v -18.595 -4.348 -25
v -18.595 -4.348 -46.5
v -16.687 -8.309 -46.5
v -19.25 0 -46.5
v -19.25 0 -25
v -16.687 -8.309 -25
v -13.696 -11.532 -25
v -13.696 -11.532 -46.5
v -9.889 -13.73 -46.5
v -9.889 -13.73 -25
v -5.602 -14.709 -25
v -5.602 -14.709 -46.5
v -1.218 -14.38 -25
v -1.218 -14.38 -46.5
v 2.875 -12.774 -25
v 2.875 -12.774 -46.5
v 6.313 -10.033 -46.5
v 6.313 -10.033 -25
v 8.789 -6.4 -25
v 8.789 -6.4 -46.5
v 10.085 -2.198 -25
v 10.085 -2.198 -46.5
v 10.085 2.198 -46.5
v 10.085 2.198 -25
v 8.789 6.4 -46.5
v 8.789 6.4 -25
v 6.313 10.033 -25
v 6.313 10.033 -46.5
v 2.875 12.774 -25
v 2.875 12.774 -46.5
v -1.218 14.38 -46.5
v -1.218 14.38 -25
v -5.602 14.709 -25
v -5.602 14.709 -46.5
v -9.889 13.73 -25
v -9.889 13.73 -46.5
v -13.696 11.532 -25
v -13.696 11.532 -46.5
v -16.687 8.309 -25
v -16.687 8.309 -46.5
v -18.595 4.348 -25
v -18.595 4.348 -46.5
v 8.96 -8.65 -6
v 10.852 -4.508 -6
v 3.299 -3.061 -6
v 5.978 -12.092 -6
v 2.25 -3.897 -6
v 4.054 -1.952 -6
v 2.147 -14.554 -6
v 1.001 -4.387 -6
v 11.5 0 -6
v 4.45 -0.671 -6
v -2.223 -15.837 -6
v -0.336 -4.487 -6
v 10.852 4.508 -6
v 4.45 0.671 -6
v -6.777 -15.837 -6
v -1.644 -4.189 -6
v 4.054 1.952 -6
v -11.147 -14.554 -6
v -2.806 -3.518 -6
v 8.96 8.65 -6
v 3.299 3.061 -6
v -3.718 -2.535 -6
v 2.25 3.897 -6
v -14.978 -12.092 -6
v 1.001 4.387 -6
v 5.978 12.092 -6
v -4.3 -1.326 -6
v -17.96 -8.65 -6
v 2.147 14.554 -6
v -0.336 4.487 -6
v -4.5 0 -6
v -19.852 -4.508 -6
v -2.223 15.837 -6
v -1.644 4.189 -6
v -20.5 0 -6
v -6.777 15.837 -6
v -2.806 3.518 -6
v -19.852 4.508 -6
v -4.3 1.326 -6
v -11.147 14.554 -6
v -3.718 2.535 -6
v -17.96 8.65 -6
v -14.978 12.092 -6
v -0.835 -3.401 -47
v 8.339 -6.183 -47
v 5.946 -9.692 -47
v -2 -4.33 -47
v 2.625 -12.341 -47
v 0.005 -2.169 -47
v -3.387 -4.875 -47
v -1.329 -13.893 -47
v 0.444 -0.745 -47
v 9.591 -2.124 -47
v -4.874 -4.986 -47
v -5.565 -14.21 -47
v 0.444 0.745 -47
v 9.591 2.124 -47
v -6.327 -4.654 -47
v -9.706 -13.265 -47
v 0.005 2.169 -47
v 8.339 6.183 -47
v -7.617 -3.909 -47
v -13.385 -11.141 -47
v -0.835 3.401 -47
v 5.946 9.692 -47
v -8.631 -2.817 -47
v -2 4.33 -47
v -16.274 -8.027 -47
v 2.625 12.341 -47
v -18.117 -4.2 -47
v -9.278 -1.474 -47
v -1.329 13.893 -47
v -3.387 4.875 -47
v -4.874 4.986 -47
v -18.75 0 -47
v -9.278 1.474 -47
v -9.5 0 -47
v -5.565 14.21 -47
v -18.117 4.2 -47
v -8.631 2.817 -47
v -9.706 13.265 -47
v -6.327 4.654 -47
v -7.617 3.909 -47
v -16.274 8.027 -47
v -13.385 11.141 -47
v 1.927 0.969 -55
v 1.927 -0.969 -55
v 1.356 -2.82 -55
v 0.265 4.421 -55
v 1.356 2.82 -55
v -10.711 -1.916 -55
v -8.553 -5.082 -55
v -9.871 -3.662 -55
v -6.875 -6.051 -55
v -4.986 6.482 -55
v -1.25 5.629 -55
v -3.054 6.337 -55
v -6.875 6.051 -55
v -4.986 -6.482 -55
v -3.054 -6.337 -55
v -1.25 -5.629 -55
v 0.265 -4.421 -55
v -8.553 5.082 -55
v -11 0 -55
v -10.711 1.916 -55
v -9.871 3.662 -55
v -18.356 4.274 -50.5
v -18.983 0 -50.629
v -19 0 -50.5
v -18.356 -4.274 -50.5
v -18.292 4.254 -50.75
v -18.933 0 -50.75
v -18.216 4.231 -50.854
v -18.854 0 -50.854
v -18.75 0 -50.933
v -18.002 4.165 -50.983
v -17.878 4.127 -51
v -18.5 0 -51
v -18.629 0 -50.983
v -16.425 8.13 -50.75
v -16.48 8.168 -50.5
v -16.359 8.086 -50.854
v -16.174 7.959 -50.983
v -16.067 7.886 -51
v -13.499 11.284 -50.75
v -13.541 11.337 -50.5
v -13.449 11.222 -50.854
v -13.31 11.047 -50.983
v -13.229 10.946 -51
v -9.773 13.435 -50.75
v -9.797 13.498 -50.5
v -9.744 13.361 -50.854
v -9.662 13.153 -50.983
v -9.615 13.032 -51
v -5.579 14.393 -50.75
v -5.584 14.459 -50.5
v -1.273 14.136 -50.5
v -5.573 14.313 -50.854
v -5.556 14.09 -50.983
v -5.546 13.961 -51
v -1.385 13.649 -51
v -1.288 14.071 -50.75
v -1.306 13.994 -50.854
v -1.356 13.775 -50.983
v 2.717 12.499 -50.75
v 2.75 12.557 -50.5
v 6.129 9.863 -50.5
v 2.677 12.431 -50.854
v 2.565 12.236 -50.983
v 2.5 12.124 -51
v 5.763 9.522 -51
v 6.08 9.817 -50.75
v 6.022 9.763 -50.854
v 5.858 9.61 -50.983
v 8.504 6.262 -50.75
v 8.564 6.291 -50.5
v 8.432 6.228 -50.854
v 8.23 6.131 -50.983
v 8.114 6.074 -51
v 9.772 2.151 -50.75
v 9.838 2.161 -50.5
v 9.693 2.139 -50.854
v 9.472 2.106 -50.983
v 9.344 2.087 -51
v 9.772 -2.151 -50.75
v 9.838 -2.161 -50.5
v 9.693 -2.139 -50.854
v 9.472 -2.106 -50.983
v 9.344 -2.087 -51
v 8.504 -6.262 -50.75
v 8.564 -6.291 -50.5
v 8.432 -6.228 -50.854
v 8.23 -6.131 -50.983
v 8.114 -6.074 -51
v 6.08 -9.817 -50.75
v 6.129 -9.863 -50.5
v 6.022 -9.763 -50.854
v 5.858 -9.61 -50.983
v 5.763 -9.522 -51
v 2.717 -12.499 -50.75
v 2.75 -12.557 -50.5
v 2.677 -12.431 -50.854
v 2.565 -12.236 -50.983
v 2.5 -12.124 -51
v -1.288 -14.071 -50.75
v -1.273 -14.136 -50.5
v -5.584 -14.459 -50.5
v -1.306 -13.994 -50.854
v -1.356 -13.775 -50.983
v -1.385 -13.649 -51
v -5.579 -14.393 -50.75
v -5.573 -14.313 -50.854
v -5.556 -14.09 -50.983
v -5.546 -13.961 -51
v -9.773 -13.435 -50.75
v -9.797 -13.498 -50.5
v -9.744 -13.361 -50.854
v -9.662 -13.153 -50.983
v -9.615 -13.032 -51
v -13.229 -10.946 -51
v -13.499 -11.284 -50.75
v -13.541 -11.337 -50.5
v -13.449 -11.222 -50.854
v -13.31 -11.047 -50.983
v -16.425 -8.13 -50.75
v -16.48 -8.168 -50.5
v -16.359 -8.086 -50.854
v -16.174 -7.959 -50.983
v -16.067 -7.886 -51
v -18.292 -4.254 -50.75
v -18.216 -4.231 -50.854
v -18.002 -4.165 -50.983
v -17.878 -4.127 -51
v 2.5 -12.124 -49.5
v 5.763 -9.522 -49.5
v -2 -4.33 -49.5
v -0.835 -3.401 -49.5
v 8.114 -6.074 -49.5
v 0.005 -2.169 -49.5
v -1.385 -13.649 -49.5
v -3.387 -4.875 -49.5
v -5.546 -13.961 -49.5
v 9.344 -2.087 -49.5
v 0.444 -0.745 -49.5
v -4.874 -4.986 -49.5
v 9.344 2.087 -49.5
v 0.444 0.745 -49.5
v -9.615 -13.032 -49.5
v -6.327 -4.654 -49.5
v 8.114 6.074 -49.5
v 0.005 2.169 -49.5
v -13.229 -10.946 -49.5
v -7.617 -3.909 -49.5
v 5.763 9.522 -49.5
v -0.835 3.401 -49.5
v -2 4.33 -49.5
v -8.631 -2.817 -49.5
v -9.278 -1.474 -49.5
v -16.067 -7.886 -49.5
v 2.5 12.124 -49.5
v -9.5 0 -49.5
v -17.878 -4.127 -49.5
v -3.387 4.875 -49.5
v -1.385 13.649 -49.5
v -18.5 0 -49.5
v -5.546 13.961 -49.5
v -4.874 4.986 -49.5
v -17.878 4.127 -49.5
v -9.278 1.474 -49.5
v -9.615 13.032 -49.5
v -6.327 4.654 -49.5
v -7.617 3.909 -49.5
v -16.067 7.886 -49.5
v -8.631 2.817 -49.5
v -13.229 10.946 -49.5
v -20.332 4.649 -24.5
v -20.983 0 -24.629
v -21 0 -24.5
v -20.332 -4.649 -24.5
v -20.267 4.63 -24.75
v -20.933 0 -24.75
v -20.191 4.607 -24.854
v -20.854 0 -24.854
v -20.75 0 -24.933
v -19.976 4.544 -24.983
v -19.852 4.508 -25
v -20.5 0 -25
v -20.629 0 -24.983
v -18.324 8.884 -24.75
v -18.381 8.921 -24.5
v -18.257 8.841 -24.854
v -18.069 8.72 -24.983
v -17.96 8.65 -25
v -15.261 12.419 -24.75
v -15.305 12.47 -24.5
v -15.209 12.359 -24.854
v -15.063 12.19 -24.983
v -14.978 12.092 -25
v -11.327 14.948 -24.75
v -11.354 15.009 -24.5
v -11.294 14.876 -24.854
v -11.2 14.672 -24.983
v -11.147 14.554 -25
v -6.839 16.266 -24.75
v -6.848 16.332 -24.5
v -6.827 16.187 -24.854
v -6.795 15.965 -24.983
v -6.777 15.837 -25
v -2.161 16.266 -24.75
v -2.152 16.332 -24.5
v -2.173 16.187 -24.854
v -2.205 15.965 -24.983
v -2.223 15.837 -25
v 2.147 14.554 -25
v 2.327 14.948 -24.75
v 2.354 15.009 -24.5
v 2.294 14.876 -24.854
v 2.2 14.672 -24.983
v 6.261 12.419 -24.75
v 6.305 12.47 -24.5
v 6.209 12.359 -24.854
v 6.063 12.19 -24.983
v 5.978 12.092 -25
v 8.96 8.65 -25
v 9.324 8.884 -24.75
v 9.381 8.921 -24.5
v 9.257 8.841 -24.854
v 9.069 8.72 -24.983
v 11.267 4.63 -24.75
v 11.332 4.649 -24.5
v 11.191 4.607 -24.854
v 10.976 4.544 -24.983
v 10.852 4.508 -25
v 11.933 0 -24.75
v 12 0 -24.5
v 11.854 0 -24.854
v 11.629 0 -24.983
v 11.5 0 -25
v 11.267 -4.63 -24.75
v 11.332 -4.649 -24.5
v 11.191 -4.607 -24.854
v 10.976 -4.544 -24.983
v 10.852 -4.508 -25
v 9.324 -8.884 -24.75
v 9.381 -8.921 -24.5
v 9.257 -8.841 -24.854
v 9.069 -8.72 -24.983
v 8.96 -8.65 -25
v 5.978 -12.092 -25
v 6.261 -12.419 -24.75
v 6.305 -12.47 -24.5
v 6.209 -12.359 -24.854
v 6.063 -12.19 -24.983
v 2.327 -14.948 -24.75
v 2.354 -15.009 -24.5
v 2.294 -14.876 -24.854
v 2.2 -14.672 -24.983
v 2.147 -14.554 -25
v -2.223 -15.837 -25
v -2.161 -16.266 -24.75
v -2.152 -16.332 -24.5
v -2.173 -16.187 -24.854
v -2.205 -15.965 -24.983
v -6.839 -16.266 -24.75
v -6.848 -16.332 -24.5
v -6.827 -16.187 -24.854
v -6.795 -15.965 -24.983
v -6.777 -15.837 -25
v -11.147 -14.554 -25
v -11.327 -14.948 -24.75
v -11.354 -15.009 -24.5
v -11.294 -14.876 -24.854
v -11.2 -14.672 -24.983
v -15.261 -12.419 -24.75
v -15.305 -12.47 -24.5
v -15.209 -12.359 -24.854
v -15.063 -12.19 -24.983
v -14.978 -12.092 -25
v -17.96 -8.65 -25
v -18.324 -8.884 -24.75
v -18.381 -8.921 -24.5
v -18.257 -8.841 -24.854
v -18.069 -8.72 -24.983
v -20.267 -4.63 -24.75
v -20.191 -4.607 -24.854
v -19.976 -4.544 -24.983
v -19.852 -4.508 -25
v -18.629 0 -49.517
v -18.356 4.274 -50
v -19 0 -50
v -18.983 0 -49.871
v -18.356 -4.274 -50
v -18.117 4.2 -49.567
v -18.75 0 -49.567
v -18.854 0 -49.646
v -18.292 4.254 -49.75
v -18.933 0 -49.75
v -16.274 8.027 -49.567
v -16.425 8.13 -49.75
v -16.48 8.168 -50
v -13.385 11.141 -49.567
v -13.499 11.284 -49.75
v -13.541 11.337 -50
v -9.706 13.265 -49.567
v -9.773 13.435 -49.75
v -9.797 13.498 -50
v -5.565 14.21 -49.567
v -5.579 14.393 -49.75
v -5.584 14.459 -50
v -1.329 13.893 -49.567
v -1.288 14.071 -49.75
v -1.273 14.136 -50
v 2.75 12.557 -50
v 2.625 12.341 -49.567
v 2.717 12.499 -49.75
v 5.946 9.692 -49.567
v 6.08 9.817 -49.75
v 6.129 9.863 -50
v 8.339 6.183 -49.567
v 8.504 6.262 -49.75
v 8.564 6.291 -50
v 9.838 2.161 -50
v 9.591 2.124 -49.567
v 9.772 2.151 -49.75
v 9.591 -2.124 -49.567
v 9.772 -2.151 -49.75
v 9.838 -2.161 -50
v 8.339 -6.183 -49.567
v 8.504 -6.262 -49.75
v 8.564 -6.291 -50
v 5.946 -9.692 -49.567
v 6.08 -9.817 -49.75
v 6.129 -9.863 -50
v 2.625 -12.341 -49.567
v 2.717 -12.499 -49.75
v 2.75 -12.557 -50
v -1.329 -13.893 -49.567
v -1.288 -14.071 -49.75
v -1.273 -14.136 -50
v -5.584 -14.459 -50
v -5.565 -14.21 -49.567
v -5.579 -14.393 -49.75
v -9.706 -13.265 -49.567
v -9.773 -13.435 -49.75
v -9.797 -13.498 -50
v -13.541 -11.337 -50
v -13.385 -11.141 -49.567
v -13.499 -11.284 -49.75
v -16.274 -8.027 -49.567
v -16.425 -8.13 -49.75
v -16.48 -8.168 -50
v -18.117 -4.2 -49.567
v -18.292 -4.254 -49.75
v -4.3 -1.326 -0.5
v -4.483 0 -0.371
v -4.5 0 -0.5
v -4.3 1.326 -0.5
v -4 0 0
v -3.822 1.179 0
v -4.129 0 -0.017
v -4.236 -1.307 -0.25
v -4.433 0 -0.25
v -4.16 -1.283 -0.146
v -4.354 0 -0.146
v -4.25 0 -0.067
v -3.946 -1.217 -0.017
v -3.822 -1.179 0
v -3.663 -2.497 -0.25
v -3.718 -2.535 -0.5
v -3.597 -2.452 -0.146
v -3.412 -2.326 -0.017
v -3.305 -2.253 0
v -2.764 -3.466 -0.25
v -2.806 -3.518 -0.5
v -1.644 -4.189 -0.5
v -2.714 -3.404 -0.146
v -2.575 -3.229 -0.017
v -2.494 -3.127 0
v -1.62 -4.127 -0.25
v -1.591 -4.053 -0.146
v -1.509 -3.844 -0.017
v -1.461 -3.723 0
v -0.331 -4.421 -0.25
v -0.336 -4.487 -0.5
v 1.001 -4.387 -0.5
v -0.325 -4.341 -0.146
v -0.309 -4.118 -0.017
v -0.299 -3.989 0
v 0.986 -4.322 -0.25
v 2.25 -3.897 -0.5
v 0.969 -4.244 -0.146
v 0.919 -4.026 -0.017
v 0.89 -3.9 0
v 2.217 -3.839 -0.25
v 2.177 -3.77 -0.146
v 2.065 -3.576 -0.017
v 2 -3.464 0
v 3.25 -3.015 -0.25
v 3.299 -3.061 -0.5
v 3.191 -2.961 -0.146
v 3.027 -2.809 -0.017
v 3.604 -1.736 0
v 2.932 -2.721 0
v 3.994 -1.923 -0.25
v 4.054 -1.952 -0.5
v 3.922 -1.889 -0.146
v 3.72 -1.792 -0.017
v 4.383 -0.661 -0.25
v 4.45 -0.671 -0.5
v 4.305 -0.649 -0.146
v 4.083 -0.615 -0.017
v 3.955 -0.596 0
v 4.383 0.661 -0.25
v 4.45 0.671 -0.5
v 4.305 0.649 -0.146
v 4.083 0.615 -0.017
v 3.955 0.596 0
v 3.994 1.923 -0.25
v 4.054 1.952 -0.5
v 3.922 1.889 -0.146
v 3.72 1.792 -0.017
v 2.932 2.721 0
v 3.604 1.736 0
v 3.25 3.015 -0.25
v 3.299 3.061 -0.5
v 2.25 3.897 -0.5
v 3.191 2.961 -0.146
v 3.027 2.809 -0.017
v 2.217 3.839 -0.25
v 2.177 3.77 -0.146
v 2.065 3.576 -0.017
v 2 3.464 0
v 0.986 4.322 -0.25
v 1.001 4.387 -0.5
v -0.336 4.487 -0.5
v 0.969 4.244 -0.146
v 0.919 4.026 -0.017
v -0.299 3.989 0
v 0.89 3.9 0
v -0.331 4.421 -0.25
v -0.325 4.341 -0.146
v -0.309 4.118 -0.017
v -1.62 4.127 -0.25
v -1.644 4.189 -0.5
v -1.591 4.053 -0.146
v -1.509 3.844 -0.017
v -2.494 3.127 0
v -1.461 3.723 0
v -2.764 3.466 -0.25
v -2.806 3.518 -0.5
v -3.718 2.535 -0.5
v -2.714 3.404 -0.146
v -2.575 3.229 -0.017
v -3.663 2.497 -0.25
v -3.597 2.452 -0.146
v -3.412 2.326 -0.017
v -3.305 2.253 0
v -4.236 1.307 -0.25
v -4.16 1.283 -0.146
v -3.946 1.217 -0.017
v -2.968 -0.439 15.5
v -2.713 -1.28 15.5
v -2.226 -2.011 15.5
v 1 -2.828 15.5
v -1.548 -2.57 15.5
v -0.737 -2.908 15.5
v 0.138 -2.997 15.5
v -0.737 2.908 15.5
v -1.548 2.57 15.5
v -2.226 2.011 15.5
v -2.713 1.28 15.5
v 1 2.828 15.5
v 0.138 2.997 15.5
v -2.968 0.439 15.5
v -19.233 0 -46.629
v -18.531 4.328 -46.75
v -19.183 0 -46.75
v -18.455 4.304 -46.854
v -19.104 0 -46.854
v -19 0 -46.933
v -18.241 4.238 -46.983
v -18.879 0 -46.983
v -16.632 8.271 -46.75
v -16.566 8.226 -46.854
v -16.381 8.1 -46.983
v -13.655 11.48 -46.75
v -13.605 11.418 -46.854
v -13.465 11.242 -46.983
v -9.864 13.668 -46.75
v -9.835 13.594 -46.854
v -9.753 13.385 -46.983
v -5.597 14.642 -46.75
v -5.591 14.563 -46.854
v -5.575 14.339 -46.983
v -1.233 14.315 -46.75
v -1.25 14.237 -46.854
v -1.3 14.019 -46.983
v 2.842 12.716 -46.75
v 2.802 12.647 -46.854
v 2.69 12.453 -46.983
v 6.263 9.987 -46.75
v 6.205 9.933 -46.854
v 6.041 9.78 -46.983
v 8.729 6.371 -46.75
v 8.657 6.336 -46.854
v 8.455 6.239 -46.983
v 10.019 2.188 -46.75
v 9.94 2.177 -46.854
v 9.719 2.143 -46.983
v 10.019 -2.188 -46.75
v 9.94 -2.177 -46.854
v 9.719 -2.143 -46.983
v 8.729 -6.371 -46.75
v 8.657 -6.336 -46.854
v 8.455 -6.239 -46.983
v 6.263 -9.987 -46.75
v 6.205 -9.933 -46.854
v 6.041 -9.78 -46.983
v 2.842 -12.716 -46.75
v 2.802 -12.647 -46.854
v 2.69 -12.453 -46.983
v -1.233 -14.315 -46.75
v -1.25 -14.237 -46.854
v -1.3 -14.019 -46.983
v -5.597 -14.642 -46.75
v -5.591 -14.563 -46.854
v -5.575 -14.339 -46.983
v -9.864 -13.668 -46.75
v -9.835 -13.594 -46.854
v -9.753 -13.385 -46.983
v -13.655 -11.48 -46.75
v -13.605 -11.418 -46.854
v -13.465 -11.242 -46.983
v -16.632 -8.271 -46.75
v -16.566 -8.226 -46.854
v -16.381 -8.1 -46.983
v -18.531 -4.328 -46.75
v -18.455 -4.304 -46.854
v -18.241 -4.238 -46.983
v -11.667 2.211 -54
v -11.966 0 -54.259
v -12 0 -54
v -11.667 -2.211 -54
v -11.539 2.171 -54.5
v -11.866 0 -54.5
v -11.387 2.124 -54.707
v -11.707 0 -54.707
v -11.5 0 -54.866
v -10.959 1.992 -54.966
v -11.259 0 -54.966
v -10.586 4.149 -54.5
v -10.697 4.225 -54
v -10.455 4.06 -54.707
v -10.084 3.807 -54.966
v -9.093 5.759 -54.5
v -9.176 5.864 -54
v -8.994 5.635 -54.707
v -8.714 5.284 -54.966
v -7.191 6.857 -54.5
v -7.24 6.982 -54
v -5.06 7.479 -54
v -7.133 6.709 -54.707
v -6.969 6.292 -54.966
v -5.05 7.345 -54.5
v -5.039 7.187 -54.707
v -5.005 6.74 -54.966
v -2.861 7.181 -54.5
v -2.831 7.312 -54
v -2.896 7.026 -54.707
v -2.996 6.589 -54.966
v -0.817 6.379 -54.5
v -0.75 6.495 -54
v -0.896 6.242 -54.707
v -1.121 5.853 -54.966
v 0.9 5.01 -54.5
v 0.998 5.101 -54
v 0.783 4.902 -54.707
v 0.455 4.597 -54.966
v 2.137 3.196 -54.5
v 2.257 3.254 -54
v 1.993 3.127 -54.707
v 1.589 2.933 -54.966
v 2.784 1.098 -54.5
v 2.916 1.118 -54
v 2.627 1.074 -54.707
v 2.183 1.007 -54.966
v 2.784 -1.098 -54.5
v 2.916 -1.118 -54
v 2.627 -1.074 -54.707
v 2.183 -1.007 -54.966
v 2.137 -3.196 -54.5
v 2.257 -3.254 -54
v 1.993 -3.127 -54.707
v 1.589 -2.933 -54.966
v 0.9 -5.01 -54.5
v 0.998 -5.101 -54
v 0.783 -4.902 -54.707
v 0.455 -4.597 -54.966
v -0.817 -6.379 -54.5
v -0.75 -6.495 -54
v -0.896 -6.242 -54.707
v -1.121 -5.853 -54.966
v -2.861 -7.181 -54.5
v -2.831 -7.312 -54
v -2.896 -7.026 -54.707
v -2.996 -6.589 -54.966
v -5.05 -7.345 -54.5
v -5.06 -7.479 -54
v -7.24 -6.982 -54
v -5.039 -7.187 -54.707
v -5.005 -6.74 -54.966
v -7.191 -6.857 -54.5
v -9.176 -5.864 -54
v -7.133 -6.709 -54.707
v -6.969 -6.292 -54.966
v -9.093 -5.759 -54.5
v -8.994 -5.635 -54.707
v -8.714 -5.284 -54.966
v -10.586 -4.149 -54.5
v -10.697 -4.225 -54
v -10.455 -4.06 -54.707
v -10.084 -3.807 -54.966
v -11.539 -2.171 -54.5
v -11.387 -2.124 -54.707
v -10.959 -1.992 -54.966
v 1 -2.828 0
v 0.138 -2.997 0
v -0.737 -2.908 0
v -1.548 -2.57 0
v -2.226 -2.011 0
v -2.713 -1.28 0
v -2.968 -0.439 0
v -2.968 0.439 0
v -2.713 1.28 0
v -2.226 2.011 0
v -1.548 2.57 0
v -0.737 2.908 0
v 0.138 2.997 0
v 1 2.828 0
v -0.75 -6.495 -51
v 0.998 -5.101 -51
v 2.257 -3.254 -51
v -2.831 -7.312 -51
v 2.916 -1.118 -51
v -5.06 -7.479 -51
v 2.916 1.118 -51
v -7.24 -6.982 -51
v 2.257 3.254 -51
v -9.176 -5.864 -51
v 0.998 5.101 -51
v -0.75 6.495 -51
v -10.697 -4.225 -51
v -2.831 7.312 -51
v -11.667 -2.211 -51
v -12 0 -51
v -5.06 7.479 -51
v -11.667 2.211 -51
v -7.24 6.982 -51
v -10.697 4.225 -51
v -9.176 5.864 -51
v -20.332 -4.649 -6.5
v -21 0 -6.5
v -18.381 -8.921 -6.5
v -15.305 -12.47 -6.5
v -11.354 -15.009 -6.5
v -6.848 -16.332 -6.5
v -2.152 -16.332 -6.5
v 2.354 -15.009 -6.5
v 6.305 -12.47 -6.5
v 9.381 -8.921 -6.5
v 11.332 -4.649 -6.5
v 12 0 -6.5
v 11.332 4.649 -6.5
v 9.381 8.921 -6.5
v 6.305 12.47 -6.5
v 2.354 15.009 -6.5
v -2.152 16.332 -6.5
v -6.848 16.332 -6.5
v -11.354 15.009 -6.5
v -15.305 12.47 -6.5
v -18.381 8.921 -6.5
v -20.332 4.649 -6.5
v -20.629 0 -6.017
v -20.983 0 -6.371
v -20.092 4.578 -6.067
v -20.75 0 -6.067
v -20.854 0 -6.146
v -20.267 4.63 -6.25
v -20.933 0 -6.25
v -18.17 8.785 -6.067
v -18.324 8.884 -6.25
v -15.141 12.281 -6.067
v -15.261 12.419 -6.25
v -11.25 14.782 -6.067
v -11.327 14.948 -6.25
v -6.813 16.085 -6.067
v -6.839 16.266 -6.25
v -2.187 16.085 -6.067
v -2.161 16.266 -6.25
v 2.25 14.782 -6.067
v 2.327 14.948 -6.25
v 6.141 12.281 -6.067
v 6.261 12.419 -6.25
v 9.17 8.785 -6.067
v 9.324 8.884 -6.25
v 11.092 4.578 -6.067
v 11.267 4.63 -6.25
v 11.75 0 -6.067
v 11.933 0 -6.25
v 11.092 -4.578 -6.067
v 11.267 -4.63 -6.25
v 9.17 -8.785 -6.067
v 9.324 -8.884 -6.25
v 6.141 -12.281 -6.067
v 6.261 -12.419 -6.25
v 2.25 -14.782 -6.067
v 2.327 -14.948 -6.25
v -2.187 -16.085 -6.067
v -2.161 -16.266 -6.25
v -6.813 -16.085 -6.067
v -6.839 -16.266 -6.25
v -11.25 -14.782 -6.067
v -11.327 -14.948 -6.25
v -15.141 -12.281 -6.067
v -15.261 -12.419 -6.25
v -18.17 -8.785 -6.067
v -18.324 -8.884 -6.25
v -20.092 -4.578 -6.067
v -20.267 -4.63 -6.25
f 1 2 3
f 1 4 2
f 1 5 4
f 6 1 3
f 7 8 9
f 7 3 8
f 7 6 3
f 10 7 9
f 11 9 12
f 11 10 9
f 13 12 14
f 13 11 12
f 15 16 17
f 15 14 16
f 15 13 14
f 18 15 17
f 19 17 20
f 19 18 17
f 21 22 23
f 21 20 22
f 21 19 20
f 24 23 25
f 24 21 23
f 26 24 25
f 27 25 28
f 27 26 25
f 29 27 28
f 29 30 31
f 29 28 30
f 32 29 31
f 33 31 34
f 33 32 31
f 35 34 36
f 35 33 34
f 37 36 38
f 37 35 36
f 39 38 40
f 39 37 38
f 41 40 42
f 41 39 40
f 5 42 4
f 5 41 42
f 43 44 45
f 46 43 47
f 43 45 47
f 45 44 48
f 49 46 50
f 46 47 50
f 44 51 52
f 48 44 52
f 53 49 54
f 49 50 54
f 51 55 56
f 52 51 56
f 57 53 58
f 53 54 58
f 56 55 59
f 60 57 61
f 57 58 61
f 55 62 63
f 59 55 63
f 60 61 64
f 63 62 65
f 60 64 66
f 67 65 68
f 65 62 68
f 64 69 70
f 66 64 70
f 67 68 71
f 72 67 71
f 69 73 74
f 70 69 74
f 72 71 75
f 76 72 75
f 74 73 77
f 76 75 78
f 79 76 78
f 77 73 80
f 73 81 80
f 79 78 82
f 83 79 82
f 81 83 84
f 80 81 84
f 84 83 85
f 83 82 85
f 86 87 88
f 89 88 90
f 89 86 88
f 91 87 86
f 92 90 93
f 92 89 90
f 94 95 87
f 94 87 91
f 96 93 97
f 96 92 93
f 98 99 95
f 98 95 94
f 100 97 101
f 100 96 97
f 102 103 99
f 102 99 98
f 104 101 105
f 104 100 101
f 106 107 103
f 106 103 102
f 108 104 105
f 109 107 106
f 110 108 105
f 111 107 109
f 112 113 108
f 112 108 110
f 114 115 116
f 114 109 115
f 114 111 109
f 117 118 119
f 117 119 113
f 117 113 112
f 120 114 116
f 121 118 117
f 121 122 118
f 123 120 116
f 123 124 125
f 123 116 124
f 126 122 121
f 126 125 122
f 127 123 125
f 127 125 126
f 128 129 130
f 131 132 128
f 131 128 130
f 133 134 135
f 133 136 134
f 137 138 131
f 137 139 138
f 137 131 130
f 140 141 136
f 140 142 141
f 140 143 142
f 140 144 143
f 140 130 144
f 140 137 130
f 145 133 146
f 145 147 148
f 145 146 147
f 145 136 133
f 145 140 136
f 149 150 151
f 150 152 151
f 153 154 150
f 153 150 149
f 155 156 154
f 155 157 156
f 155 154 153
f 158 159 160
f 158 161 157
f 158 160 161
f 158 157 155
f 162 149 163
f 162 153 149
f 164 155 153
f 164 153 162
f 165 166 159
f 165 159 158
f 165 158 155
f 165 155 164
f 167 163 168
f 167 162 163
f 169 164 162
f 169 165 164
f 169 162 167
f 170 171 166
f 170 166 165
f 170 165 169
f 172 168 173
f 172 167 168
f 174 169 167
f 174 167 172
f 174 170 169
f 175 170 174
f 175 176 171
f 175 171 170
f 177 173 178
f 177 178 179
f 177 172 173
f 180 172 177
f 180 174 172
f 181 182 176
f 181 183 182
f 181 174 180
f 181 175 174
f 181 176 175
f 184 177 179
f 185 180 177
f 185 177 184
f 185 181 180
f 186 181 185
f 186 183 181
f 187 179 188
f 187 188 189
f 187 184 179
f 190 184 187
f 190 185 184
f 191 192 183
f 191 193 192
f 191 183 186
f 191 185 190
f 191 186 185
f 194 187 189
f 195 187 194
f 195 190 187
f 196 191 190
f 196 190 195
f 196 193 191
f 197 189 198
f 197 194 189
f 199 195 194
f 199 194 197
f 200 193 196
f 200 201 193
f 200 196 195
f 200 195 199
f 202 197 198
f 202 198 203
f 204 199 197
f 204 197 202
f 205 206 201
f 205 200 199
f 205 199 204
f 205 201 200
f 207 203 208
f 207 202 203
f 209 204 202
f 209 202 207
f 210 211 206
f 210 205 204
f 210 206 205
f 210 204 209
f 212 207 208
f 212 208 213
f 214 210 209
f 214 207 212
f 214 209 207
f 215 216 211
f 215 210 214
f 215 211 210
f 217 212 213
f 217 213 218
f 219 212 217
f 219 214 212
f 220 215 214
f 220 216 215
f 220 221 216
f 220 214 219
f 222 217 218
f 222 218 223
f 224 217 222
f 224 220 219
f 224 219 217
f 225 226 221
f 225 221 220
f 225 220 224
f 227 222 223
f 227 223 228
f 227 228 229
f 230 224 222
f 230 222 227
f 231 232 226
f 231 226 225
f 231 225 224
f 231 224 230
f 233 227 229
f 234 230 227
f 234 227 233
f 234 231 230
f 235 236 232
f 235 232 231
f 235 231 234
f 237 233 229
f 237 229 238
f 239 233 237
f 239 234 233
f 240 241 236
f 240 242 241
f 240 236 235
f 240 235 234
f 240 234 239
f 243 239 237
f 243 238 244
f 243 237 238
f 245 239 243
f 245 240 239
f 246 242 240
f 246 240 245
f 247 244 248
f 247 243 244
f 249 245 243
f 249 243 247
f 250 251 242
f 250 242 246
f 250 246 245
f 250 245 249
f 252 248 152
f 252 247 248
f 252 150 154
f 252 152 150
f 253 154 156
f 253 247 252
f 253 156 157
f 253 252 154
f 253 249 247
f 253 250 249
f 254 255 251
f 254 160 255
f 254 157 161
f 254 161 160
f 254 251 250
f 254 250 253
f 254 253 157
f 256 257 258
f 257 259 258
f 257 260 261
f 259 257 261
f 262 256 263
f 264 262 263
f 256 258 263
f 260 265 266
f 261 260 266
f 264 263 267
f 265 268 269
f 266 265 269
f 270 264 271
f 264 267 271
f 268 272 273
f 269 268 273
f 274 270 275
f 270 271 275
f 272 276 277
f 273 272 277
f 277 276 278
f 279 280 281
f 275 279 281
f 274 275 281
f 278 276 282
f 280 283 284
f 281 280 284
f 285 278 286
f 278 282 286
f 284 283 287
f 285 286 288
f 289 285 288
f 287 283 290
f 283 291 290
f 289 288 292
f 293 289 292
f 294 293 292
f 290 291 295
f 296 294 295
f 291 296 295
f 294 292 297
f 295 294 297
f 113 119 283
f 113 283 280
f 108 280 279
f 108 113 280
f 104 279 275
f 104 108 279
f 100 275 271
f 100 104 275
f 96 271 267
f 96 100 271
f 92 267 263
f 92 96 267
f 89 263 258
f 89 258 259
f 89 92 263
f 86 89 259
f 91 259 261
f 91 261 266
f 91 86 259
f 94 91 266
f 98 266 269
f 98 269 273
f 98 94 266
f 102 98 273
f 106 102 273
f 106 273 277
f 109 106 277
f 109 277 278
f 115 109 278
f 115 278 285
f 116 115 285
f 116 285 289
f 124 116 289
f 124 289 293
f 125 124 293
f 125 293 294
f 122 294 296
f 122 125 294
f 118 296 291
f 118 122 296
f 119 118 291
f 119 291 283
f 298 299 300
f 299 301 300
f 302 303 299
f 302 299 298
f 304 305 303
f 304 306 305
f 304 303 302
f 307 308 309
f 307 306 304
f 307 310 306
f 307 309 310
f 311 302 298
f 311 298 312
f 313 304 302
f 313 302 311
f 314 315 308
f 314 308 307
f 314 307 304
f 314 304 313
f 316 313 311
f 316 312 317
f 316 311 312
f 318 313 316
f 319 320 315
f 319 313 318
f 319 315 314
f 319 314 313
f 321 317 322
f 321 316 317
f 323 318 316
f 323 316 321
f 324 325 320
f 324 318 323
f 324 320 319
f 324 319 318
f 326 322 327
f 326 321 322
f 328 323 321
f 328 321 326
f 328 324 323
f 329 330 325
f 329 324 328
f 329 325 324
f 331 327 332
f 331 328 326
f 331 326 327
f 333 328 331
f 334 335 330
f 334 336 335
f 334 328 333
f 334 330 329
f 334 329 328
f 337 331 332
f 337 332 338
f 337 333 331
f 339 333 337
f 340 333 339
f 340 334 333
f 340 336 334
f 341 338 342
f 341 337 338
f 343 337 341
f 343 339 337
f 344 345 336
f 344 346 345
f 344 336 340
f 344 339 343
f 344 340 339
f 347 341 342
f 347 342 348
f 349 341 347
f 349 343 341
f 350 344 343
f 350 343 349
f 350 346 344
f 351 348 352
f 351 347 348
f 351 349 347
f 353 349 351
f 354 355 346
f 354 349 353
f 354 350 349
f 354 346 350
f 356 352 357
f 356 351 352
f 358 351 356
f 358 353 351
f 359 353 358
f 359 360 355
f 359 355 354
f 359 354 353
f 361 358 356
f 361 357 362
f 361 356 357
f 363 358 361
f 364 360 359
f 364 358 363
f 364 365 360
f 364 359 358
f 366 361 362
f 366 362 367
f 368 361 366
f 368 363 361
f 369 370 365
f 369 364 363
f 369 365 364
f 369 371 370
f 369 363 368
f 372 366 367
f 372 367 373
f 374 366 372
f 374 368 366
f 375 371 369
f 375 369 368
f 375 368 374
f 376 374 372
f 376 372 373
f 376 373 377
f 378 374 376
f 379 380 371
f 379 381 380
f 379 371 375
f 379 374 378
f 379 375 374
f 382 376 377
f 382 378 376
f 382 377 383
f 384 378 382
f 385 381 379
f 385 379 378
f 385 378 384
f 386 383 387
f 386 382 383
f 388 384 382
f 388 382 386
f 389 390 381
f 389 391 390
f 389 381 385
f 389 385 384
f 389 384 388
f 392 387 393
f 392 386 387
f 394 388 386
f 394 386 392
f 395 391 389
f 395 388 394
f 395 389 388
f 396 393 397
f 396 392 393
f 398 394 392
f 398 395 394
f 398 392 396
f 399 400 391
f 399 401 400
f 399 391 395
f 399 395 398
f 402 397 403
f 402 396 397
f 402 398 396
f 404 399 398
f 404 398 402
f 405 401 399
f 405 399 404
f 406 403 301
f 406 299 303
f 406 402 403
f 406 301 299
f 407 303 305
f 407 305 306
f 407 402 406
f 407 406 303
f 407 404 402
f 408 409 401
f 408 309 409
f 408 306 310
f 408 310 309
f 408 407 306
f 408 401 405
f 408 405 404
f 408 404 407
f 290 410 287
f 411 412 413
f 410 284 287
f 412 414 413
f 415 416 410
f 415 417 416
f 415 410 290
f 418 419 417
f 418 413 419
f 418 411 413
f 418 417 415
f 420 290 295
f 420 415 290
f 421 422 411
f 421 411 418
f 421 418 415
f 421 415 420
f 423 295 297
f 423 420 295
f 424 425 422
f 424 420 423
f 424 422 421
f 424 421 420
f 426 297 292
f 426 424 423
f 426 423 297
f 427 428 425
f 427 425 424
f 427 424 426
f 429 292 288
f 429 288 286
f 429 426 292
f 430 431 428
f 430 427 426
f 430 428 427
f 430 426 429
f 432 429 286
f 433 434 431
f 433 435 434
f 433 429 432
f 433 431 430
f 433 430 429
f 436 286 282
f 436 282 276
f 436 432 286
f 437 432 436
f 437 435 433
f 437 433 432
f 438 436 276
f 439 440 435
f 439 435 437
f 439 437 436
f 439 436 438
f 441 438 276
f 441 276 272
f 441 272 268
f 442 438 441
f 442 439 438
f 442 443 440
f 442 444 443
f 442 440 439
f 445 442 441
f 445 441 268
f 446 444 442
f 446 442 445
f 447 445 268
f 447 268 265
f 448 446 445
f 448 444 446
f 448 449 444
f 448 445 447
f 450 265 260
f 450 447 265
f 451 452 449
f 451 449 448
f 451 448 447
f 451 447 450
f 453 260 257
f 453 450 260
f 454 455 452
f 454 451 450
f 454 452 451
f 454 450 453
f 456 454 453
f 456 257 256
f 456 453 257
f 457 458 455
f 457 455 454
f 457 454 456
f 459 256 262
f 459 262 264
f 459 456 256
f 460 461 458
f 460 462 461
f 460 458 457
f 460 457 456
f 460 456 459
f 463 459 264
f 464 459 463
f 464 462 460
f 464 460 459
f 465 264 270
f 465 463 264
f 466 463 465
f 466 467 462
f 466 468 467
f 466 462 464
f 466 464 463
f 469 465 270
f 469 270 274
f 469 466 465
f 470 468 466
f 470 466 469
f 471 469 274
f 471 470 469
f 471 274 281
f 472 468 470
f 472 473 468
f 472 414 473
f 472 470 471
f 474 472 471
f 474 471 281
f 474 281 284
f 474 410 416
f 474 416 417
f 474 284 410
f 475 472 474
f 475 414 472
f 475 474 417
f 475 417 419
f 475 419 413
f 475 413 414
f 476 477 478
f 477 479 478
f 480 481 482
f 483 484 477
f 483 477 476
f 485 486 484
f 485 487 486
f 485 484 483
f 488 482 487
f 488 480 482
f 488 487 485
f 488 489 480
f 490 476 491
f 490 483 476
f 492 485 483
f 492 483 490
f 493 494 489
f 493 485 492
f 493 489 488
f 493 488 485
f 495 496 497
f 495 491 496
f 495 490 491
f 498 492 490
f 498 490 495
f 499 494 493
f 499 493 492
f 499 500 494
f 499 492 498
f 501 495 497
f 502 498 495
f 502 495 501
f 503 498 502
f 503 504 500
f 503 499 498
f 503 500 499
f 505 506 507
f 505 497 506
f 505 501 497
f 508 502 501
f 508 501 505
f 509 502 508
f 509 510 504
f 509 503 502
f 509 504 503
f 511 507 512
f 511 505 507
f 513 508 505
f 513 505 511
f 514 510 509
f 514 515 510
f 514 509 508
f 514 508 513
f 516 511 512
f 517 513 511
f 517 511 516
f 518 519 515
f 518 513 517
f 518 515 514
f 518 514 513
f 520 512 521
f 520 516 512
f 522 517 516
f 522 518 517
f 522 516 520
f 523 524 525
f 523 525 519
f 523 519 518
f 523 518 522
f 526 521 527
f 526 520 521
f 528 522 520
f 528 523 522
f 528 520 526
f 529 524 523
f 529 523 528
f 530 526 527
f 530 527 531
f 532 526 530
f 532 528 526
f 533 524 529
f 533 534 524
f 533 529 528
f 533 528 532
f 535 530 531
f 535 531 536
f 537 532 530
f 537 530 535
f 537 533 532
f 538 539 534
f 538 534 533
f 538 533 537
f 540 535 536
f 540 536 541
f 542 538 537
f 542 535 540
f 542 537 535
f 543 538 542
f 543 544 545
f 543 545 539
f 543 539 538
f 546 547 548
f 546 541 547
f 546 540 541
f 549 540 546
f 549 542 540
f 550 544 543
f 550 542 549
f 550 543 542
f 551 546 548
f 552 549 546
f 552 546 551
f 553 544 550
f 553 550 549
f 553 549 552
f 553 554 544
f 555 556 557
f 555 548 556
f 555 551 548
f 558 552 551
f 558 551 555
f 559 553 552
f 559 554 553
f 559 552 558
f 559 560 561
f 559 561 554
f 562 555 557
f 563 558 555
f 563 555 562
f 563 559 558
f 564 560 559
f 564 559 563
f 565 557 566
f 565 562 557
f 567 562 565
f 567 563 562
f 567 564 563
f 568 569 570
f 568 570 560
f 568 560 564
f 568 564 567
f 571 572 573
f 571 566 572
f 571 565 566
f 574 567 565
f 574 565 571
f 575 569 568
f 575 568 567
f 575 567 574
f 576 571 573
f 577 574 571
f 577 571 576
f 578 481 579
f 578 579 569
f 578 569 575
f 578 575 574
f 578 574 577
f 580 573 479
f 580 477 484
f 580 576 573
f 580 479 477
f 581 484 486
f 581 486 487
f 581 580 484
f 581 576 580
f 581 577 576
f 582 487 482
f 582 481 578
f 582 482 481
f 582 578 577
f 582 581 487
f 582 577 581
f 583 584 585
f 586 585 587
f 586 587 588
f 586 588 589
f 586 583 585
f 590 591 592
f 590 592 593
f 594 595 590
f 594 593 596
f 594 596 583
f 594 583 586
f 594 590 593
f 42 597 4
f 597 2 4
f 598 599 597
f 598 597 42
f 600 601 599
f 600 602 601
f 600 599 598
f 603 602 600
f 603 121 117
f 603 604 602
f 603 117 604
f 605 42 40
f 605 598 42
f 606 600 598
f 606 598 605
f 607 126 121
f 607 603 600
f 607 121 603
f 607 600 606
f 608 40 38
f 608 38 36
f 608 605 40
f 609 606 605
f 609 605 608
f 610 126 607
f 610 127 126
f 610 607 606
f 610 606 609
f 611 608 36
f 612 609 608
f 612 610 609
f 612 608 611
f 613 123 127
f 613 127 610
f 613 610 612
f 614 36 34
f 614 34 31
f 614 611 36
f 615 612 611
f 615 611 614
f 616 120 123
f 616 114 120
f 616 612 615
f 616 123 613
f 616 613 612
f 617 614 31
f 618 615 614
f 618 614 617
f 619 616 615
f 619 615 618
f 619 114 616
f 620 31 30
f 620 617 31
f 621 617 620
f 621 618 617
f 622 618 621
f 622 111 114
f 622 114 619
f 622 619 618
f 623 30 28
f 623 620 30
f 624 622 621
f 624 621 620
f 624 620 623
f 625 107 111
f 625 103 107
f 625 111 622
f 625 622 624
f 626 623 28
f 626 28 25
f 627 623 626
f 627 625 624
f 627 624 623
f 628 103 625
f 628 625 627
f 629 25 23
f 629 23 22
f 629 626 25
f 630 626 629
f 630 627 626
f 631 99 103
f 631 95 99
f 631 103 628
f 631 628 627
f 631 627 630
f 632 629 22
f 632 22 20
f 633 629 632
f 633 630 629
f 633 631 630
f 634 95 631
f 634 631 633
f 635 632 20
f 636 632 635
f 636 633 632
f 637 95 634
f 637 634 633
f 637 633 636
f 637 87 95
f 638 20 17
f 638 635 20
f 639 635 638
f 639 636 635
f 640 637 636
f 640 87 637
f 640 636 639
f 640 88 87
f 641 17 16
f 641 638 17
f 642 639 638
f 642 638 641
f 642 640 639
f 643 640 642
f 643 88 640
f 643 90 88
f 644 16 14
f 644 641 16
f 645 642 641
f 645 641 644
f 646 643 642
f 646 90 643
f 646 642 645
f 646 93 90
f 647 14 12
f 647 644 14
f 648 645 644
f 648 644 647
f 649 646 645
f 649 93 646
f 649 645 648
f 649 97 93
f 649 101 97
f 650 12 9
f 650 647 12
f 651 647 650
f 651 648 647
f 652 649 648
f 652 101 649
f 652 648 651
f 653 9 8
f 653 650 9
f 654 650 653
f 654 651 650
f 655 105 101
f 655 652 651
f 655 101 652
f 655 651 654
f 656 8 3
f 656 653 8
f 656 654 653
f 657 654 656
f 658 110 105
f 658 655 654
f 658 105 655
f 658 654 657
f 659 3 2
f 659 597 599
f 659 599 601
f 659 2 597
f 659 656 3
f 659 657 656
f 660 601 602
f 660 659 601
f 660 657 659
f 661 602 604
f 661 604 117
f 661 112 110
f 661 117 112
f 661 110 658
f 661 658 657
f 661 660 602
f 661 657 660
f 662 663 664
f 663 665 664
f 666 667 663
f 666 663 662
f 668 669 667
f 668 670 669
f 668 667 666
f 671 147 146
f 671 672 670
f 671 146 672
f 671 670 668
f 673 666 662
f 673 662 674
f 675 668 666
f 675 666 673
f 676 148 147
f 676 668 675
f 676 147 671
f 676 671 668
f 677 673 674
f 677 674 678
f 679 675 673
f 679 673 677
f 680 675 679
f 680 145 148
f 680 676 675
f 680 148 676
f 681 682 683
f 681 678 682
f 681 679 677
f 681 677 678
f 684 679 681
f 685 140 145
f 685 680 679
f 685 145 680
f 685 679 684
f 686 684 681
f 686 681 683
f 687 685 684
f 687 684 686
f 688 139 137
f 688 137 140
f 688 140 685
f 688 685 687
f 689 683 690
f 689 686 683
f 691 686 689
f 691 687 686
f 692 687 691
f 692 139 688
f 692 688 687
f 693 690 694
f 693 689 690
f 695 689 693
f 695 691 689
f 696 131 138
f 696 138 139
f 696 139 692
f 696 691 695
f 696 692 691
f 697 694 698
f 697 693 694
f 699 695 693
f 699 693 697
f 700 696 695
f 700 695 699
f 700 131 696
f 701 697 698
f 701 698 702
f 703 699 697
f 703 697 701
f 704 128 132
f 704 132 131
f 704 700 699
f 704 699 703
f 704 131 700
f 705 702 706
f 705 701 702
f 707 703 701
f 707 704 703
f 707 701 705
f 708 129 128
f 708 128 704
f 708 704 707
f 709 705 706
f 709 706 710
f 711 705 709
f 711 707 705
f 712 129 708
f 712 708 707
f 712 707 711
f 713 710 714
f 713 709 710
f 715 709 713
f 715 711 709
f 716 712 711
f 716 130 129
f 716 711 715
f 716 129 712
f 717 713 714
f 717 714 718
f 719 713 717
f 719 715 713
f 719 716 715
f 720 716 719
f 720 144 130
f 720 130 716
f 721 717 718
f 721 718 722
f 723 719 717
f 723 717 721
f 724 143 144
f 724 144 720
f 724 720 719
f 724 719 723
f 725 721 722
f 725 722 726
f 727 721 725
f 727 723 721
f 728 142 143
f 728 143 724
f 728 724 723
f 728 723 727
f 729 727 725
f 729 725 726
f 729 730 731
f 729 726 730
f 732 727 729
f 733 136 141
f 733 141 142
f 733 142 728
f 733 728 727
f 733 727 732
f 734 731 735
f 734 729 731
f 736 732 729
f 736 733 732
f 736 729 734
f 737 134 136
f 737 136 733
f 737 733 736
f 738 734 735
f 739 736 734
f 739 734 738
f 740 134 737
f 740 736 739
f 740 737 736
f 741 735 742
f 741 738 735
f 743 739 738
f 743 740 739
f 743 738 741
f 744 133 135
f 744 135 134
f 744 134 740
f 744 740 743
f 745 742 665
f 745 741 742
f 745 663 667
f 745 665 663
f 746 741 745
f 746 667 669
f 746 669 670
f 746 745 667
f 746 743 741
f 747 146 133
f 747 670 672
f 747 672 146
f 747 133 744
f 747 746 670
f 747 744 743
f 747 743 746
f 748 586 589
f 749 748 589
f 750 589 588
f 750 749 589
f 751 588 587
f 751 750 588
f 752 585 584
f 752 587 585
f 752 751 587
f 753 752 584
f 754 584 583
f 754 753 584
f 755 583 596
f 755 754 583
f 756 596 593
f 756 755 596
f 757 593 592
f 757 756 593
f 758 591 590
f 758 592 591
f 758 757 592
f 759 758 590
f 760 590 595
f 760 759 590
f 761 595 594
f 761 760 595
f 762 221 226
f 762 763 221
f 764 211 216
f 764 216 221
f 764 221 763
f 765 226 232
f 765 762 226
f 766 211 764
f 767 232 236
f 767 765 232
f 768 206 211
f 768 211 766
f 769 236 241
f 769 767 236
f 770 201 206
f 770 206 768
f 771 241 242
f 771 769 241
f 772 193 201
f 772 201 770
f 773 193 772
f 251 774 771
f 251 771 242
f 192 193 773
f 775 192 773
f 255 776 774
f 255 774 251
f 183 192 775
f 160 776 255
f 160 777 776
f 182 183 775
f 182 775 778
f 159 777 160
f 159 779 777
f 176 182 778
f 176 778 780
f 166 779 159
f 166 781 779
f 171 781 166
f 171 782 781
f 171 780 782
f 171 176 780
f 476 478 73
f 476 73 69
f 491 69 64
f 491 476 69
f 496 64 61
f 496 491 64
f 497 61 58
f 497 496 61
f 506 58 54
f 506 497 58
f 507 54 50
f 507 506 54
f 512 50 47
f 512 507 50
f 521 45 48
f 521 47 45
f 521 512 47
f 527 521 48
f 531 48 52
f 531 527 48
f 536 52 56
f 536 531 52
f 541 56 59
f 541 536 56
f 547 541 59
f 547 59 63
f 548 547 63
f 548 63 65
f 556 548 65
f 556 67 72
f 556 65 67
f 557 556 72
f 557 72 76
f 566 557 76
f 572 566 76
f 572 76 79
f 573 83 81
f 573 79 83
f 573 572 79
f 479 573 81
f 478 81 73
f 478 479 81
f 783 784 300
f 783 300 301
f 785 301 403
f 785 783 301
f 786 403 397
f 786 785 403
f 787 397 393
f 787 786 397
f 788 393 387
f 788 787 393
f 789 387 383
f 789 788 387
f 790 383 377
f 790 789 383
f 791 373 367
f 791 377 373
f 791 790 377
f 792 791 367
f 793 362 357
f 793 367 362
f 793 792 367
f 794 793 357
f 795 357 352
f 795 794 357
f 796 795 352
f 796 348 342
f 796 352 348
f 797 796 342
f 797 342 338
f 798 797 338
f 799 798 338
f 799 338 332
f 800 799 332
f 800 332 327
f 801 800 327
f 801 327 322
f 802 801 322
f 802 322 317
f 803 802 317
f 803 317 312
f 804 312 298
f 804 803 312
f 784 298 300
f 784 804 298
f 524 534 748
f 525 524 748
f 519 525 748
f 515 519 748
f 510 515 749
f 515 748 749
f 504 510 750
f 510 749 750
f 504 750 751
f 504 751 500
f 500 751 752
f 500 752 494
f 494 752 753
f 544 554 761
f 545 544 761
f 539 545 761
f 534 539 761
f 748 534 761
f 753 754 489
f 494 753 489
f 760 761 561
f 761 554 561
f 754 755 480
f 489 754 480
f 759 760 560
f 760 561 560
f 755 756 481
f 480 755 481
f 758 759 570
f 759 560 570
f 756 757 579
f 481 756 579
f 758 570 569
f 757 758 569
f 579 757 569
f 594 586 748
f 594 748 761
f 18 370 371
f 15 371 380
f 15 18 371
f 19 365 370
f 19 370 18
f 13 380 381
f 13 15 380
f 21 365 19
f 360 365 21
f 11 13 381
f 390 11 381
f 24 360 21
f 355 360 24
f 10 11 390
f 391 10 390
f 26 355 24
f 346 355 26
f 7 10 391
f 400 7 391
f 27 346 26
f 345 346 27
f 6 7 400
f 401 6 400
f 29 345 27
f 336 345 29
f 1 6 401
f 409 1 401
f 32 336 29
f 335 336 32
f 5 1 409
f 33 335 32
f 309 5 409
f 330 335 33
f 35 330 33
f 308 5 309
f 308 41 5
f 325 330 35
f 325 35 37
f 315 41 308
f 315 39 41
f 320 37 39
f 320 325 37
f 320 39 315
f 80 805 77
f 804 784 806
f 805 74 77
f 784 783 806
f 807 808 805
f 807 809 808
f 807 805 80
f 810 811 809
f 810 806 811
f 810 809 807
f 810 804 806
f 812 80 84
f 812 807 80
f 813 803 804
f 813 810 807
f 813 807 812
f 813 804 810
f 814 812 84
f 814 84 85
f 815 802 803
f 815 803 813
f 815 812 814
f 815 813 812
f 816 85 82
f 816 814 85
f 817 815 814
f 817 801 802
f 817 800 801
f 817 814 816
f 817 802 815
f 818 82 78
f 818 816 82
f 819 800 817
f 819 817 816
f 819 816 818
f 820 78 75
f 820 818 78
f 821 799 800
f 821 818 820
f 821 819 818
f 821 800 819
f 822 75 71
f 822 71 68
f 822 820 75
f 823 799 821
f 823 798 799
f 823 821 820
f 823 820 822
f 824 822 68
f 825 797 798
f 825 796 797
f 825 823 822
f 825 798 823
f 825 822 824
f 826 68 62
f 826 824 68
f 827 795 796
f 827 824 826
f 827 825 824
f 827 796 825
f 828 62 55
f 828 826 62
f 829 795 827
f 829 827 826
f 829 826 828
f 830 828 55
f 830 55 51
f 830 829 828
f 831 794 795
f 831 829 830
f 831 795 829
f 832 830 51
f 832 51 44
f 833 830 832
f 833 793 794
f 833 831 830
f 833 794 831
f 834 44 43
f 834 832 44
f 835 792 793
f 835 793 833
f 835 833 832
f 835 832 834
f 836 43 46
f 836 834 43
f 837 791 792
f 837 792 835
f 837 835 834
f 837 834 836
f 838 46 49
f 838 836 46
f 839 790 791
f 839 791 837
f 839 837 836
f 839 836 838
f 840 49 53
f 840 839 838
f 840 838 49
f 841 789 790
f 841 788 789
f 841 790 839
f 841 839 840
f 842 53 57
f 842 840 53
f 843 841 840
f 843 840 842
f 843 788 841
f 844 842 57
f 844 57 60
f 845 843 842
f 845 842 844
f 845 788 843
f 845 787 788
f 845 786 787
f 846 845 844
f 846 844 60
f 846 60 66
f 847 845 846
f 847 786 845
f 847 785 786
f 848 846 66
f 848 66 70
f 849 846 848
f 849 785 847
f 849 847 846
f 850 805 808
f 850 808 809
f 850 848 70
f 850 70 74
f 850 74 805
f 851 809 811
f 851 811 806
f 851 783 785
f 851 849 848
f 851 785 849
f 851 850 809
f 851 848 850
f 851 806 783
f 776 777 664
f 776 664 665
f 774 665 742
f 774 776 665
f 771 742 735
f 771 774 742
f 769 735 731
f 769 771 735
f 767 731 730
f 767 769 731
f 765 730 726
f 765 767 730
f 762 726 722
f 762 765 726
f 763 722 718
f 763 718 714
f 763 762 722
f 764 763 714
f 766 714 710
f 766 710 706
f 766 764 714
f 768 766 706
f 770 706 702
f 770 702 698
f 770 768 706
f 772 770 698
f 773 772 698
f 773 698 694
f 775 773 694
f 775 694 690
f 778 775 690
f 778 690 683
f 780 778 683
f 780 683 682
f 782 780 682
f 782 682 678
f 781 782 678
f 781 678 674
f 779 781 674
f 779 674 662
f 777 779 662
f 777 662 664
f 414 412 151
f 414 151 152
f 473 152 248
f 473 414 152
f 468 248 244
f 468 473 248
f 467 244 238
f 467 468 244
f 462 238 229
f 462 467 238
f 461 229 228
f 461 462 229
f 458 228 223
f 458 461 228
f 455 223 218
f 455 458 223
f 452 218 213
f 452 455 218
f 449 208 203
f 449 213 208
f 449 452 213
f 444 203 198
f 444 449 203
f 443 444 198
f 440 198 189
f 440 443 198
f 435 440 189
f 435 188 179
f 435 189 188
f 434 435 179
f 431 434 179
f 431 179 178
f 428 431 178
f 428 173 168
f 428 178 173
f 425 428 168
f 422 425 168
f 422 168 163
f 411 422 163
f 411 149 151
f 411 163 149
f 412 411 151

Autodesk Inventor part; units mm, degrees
ref_plane "YZ Plane" through (0, 0, 0) normal (1, 0, 0) x (0, 1, 0)
ref_plane "XZ Plane" through (0, 0, 0) normal (0, 1, 0) x (-1, 0, 0)
ref_plane "XY Plane" through (0, 0, 0) normal (0, 0, 1) x (1, 0, 0)
sketch "Boceto1" plane through (0, 0, 0) normal (0, 0, 1) x (1, 0, 0)
  circle A0 centre (0, 0) radius 3
  dimension "d0" = 6
extrude "Extrusión1" add sketch "Boceto1" along normal blind 15.5
sketch "Boceto2" plane through (0, 0, 0) normal (0, 0, -1) x (-1, 0, 0)
  circle A0 centre (0, 0) radius 4.5
  dimension "d3" = 9
extrude "Extrusión2" add sketch "Boceto2" along normal blind 6
sketch "Boceto3" plane through (0, 0, 15.5) normal (0, 0, 1) x (1, 0, 0)
  point P0 (0, 0)
sketch "Boceto4" plane through (0, 0, -6) normal (0, 0, -1) x (-1, 0, 0)
  point P0 (0, 0)
sketch "Boceto5" plane through (0, 0, 15.5) normal (0, 0, 1) x (1, 0, 0)
  line L0 (1, 3.0944) -> (7.331, 3.0944)
  line L1 (7.331, 3.0944) -> (7.331, -4.1969)
  line L2 (7.331, -4.1969) -> (1, -4.1969)
  line L3 (1, -4.1969) -> (1, 3.0944)
  point P0 (0, 0)
  dimension "d6" = 1
extrude "Extrusión3" cut sketch "Boceto5" against normal blind 15.5
sketch "Boceto6" plane through (0, 0, -6) normal (0, 0, -1) x (-1, 0, 0)
  circle A0 centre (4.5, 0) radius 16.5
  point P0 (0, 0)
  dimension "d9" = 4.5
  dimension "d10" = 33
extrude "Extrusión4" add sketch "Boceto6" along normal blind 19
sketch "Boceto7" plane through (-4.5, 0, -25) normal (0, 0, -1) x (-1, 0, 0)
  circle A0 centre (-4.5, 0) radius 4.5 projected
  circle A1 centre (0, 0) radius 14.75
  dimension "d13" = 29.5
extrude "Extrusión5" add sketch "Boceto7" along normal blind 22 contours A0 | A1
sketch "Boceto8" plane through (-4.5, 0, -47) normal (0, 0, -1) x (-1, 0, 0)
  circle A0 centre (-4.5, 0) radius 4.5 projected
  circle A1 centre (0, 0) radius 5
  dimension "d16" = 10
extrude "Extrusión6" add sketch "Boceto8" along normal blind 2.5 contours A0 A1 | A0 A1 picked at (-3.3248, -0.7551) picked at (3.2856, 0.3961)
sketch "Boceto9" plane through (-4.5, 0, -49.5) normal (0, 0, -1) x (-1, 0, 0)
  circle A0 centre (-4.5, 0) radius 4.5 projected
  circle A1 centre (0, 0) radius 14.5
extrude "Extrusión7" add sketch "Boceto9" along normal blind 1.5 contours A0 | A1
sketch "Boceto10" plane through (-4.5, 0, -51) normal (0, 0, -1) x (-1, 0, 0)
  circle A0 centre (-4.5, 0) radius 4.5 projected
  circle A1 centre (0, 0) radius 7.5
  dimension "d21" = 15
extrude "Extrusión8" add sketch "Boceto10" along normal blind 4 contours A0 A1 | A0 A1 picked at (-4.9657, 0) picked at (4.9328, -0.5757)
fillet "Empalme1" radius 0.5 1 edges at (4.5, 0, 0)
fillet "Empalme2" radius 0.5 1 edges at (12, 0, -6)
fillet "Empalme3" radius 0.5 1 edges at (12, 0, -25)
fillet "Empalme4" radius 0.5 1 edges at (10.25, 0, -47)
fillet "Empalme5" radius 0.5 1 edges at (10, 0, -49.5)
fillet "Empalme6" radius 0.5 1 edges at (10, 0, -51)
fillet "Empalme7" radius 1 1 edges at (3, 0, -55)
properties part number "Motor"
